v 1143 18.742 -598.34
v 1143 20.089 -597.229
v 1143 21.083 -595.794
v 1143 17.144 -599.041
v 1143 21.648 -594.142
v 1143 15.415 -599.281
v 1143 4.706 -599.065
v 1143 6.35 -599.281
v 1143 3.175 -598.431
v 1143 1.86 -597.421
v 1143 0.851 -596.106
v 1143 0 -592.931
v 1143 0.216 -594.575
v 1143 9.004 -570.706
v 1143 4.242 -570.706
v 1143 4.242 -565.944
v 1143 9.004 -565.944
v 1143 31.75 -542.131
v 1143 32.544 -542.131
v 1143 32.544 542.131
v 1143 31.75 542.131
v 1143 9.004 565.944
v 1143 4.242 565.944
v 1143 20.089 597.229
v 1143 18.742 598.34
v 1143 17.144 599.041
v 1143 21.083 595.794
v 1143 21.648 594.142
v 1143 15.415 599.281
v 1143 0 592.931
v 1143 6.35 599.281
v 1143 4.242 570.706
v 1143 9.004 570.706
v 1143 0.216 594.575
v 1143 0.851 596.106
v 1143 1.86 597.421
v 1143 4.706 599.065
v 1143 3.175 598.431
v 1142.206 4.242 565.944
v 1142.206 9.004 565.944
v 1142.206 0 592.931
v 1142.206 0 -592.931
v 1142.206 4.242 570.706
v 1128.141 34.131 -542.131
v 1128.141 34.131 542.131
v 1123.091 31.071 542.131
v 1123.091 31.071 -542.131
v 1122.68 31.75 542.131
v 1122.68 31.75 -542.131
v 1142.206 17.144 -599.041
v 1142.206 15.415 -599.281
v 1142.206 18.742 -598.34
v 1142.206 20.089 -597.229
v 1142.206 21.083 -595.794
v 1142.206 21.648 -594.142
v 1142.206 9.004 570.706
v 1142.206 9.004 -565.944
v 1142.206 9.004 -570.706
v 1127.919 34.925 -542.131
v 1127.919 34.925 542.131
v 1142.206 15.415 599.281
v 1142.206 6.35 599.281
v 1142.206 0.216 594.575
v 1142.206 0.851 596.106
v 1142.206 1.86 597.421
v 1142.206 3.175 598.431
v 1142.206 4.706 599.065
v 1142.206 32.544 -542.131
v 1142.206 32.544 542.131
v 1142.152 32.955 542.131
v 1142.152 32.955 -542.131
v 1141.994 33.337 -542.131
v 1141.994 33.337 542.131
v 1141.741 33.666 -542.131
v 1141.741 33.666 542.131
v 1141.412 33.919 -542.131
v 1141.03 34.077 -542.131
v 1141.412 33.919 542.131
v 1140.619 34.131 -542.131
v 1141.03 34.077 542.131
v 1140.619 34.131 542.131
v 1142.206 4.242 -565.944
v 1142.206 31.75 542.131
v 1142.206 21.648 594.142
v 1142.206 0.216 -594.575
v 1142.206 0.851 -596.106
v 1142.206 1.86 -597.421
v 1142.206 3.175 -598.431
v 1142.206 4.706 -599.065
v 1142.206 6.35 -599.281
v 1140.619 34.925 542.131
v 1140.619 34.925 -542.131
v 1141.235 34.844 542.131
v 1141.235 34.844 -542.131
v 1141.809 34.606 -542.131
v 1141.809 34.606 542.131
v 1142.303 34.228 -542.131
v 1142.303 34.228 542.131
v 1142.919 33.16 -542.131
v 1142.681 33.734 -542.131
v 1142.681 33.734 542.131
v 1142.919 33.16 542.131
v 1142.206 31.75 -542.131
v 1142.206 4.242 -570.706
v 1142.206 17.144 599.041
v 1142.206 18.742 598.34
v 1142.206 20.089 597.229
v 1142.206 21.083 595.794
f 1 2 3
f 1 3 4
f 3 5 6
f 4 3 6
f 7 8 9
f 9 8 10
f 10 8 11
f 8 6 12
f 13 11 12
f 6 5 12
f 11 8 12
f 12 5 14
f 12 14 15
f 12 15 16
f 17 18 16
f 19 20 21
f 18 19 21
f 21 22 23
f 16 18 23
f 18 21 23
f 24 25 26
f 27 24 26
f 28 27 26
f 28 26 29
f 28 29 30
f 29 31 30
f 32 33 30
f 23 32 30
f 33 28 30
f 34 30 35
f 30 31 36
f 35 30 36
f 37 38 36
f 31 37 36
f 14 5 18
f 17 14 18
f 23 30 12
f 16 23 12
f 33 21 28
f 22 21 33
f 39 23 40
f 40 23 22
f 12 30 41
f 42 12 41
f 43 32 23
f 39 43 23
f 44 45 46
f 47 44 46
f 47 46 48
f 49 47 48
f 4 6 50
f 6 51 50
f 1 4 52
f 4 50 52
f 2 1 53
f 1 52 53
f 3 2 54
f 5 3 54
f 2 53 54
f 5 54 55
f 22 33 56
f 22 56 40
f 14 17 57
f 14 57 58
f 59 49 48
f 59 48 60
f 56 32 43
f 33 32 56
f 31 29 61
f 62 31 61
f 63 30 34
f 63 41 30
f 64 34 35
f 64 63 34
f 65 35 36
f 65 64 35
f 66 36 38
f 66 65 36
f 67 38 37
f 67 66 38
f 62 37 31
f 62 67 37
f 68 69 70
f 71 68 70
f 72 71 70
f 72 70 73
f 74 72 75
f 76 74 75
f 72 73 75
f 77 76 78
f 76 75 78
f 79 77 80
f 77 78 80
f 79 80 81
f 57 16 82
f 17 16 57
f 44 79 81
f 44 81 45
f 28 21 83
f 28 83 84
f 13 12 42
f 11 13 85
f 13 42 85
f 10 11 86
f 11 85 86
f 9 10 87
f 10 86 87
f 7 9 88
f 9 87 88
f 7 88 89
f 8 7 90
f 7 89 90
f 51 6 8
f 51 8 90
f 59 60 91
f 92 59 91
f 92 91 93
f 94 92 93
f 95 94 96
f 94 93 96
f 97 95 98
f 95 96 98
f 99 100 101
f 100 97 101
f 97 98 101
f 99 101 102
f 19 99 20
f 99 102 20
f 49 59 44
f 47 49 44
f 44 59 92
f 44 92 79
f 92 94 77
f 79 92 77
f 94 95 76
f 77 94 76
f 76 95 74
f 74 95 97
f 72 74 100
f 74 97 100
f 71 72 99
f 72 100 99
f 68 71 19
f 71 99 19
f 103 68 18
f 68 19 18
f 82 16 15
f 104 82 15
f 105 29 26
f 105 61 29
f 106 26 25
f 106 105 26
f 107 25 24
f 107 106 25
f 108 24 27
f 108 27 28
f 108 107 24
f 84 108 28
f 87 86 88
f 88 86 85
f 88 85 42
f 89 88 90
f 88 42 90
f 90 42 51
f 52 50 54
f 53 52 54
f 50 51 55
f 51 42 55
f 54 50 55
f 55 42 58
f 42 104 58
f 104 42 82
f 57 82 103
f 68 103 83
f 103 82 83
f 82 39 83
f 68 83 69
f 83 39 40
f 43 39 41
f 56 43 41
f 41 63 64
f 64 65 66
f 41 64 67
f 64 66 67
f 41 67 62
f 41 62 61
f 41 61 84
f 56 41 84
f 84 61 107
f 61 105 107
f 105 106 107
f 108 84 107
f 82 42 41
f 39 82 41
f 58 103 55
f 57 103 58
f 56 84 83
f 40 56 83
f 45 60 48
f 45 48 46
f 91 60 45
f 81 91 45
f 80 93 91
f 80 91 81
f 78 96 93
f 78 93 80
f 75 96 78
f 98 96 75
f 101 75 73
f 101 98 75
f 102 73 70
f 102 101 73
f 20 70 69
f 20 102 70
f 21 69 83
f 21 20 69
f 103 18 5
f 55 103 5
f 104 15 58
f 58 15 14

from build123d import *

# Parameters (mm, degrees)
EXTRUDE1_DEPTH     = 599.28125
CUT_EXTRUDE1_DEPTH = 25.4
CUT_EXTRUDE2_DEPTH = 25.4
CUT_EXTRUDE3_DEPTH = 25.4
SKETCH5_W          = 4.7625
SKETCH5_H          = 4.7625
CUT_EXTRUDE4_DEPTH = 0.79375
FILLET1_R          = 6.35


with BuildPart() as part:
    # Sketch1 → Extrude1 (new body, symmetric)
    with BuildSketch(Plane.XY):
        with BuildLine():
            Line((1143, 0), (1142.20625, 0))
            Line((1142.20625, 0), (1142.20625, 32.54375))
            ThreePointArc((1142.20625, 32.54375), (1141.741282015, 33.666282015), (1140.61875, 34.13125))
            Line((1140.61875, 34.13125), (1128.140506397, 34.13125))
            Line((1128.140506397, 34.13125), (1123.091401986, 31.071186722))
            Line((1123.091401986, 31.071186722), (1122.68, 31.75))
            Line((1122.68, 31.75), (1127.91875, 34.925))
            Line((1127.91875, 34.925), (1140.61875, 34.925))
            ThreePointArc((1140.61875, 34.925), (1142.302548023, 34.227548023), (1143, 32.54375))
            Line((1143, 32.54375), (1143, 0))
        make_face()
    extrude(amount=EXTRUDE1_DEPTH, both=True)

    # Sketch2 → Cut-Extrude1 (cut)
    with BuildSketch(Plane(origin=(1143, 0, 0), x_dir=(0, 0, -1), z_dir=(1, 0, 0))):
        Polygon((599.28125, 34.925), (542.13125, 34.925), (542.13125, 31.75), (599.28125, 20.6502), align=None)
        Polygon((-599.28125, 34.925), (-542.13125, 34.925), (-542.13125, 31.75), (-599.28125, 20.6502), align=None)
    extrude(amount=-CUT_EXTRUDE1_DEPTH, mode=Mode.SUBTRACT)

    # Sketch3 → Cut-Extrude2 (cut)
    with BuildSketch(Plane(origin=(0, 0, -542.13125), x_dir=(-1, 0, 0), z_dir=(0, 0, -1))):
        Polygon((-1127.91875, 34.925), (-1122.68, 31.75), (-1123.420434334, 30.528283348), (-1128.140506397, 34.13125), align=None)
    extrude(amount=CUT_EXTRUDE2_DEPTH, mode=Mode.SUBTRACT)

    # Sketch4 → Cut-Extrude3 (cut)
    with BuildSketch(Plane.XY.offset(542.13125)):
        Polygon((1127.91875, 34.925), (1122.68, 31.75), (1124.000635951, 29.570950682), (1128.140506397, 34.13125), align=None)
    extrude(amount=CUT_EXTRUDE3_DEPTH, mode=Mode.SUBTRACT)

    # Sketch5 → Cut-Extrude4 (cut)
    with BuildSketch(Plane(origin=(1143, 0, 0), x_dir=(0, 0, -1), z_dir=(1, 0, 0))):
        with Locations((568.325, 6.62305)):
            Rectangle(SKETCH5_W, SKETCH5_H)
        with Locations((-568.325, 6.62305)):
            Rectangle(SKETCH5_W, SKETCH5_H)
    extrude(amount=-CUT_EXTRUDE4_DEPTH, mode=Mode.SUBTRACT)

    # Fillet1
    fillet1_edges = [part.edges().sort_by_distance(p)[0] for p in [
        (1142.603125, 20.6502, -599.28125),
        (1142.603125, 0, 599.28125),
        (1142.603125, 20.6502, 599.28125),
        (1142.603125, 0, -599.28125),
    ]]
    fillet(fillet1_edges, radius=FILLET1_R)


solid = part.part
